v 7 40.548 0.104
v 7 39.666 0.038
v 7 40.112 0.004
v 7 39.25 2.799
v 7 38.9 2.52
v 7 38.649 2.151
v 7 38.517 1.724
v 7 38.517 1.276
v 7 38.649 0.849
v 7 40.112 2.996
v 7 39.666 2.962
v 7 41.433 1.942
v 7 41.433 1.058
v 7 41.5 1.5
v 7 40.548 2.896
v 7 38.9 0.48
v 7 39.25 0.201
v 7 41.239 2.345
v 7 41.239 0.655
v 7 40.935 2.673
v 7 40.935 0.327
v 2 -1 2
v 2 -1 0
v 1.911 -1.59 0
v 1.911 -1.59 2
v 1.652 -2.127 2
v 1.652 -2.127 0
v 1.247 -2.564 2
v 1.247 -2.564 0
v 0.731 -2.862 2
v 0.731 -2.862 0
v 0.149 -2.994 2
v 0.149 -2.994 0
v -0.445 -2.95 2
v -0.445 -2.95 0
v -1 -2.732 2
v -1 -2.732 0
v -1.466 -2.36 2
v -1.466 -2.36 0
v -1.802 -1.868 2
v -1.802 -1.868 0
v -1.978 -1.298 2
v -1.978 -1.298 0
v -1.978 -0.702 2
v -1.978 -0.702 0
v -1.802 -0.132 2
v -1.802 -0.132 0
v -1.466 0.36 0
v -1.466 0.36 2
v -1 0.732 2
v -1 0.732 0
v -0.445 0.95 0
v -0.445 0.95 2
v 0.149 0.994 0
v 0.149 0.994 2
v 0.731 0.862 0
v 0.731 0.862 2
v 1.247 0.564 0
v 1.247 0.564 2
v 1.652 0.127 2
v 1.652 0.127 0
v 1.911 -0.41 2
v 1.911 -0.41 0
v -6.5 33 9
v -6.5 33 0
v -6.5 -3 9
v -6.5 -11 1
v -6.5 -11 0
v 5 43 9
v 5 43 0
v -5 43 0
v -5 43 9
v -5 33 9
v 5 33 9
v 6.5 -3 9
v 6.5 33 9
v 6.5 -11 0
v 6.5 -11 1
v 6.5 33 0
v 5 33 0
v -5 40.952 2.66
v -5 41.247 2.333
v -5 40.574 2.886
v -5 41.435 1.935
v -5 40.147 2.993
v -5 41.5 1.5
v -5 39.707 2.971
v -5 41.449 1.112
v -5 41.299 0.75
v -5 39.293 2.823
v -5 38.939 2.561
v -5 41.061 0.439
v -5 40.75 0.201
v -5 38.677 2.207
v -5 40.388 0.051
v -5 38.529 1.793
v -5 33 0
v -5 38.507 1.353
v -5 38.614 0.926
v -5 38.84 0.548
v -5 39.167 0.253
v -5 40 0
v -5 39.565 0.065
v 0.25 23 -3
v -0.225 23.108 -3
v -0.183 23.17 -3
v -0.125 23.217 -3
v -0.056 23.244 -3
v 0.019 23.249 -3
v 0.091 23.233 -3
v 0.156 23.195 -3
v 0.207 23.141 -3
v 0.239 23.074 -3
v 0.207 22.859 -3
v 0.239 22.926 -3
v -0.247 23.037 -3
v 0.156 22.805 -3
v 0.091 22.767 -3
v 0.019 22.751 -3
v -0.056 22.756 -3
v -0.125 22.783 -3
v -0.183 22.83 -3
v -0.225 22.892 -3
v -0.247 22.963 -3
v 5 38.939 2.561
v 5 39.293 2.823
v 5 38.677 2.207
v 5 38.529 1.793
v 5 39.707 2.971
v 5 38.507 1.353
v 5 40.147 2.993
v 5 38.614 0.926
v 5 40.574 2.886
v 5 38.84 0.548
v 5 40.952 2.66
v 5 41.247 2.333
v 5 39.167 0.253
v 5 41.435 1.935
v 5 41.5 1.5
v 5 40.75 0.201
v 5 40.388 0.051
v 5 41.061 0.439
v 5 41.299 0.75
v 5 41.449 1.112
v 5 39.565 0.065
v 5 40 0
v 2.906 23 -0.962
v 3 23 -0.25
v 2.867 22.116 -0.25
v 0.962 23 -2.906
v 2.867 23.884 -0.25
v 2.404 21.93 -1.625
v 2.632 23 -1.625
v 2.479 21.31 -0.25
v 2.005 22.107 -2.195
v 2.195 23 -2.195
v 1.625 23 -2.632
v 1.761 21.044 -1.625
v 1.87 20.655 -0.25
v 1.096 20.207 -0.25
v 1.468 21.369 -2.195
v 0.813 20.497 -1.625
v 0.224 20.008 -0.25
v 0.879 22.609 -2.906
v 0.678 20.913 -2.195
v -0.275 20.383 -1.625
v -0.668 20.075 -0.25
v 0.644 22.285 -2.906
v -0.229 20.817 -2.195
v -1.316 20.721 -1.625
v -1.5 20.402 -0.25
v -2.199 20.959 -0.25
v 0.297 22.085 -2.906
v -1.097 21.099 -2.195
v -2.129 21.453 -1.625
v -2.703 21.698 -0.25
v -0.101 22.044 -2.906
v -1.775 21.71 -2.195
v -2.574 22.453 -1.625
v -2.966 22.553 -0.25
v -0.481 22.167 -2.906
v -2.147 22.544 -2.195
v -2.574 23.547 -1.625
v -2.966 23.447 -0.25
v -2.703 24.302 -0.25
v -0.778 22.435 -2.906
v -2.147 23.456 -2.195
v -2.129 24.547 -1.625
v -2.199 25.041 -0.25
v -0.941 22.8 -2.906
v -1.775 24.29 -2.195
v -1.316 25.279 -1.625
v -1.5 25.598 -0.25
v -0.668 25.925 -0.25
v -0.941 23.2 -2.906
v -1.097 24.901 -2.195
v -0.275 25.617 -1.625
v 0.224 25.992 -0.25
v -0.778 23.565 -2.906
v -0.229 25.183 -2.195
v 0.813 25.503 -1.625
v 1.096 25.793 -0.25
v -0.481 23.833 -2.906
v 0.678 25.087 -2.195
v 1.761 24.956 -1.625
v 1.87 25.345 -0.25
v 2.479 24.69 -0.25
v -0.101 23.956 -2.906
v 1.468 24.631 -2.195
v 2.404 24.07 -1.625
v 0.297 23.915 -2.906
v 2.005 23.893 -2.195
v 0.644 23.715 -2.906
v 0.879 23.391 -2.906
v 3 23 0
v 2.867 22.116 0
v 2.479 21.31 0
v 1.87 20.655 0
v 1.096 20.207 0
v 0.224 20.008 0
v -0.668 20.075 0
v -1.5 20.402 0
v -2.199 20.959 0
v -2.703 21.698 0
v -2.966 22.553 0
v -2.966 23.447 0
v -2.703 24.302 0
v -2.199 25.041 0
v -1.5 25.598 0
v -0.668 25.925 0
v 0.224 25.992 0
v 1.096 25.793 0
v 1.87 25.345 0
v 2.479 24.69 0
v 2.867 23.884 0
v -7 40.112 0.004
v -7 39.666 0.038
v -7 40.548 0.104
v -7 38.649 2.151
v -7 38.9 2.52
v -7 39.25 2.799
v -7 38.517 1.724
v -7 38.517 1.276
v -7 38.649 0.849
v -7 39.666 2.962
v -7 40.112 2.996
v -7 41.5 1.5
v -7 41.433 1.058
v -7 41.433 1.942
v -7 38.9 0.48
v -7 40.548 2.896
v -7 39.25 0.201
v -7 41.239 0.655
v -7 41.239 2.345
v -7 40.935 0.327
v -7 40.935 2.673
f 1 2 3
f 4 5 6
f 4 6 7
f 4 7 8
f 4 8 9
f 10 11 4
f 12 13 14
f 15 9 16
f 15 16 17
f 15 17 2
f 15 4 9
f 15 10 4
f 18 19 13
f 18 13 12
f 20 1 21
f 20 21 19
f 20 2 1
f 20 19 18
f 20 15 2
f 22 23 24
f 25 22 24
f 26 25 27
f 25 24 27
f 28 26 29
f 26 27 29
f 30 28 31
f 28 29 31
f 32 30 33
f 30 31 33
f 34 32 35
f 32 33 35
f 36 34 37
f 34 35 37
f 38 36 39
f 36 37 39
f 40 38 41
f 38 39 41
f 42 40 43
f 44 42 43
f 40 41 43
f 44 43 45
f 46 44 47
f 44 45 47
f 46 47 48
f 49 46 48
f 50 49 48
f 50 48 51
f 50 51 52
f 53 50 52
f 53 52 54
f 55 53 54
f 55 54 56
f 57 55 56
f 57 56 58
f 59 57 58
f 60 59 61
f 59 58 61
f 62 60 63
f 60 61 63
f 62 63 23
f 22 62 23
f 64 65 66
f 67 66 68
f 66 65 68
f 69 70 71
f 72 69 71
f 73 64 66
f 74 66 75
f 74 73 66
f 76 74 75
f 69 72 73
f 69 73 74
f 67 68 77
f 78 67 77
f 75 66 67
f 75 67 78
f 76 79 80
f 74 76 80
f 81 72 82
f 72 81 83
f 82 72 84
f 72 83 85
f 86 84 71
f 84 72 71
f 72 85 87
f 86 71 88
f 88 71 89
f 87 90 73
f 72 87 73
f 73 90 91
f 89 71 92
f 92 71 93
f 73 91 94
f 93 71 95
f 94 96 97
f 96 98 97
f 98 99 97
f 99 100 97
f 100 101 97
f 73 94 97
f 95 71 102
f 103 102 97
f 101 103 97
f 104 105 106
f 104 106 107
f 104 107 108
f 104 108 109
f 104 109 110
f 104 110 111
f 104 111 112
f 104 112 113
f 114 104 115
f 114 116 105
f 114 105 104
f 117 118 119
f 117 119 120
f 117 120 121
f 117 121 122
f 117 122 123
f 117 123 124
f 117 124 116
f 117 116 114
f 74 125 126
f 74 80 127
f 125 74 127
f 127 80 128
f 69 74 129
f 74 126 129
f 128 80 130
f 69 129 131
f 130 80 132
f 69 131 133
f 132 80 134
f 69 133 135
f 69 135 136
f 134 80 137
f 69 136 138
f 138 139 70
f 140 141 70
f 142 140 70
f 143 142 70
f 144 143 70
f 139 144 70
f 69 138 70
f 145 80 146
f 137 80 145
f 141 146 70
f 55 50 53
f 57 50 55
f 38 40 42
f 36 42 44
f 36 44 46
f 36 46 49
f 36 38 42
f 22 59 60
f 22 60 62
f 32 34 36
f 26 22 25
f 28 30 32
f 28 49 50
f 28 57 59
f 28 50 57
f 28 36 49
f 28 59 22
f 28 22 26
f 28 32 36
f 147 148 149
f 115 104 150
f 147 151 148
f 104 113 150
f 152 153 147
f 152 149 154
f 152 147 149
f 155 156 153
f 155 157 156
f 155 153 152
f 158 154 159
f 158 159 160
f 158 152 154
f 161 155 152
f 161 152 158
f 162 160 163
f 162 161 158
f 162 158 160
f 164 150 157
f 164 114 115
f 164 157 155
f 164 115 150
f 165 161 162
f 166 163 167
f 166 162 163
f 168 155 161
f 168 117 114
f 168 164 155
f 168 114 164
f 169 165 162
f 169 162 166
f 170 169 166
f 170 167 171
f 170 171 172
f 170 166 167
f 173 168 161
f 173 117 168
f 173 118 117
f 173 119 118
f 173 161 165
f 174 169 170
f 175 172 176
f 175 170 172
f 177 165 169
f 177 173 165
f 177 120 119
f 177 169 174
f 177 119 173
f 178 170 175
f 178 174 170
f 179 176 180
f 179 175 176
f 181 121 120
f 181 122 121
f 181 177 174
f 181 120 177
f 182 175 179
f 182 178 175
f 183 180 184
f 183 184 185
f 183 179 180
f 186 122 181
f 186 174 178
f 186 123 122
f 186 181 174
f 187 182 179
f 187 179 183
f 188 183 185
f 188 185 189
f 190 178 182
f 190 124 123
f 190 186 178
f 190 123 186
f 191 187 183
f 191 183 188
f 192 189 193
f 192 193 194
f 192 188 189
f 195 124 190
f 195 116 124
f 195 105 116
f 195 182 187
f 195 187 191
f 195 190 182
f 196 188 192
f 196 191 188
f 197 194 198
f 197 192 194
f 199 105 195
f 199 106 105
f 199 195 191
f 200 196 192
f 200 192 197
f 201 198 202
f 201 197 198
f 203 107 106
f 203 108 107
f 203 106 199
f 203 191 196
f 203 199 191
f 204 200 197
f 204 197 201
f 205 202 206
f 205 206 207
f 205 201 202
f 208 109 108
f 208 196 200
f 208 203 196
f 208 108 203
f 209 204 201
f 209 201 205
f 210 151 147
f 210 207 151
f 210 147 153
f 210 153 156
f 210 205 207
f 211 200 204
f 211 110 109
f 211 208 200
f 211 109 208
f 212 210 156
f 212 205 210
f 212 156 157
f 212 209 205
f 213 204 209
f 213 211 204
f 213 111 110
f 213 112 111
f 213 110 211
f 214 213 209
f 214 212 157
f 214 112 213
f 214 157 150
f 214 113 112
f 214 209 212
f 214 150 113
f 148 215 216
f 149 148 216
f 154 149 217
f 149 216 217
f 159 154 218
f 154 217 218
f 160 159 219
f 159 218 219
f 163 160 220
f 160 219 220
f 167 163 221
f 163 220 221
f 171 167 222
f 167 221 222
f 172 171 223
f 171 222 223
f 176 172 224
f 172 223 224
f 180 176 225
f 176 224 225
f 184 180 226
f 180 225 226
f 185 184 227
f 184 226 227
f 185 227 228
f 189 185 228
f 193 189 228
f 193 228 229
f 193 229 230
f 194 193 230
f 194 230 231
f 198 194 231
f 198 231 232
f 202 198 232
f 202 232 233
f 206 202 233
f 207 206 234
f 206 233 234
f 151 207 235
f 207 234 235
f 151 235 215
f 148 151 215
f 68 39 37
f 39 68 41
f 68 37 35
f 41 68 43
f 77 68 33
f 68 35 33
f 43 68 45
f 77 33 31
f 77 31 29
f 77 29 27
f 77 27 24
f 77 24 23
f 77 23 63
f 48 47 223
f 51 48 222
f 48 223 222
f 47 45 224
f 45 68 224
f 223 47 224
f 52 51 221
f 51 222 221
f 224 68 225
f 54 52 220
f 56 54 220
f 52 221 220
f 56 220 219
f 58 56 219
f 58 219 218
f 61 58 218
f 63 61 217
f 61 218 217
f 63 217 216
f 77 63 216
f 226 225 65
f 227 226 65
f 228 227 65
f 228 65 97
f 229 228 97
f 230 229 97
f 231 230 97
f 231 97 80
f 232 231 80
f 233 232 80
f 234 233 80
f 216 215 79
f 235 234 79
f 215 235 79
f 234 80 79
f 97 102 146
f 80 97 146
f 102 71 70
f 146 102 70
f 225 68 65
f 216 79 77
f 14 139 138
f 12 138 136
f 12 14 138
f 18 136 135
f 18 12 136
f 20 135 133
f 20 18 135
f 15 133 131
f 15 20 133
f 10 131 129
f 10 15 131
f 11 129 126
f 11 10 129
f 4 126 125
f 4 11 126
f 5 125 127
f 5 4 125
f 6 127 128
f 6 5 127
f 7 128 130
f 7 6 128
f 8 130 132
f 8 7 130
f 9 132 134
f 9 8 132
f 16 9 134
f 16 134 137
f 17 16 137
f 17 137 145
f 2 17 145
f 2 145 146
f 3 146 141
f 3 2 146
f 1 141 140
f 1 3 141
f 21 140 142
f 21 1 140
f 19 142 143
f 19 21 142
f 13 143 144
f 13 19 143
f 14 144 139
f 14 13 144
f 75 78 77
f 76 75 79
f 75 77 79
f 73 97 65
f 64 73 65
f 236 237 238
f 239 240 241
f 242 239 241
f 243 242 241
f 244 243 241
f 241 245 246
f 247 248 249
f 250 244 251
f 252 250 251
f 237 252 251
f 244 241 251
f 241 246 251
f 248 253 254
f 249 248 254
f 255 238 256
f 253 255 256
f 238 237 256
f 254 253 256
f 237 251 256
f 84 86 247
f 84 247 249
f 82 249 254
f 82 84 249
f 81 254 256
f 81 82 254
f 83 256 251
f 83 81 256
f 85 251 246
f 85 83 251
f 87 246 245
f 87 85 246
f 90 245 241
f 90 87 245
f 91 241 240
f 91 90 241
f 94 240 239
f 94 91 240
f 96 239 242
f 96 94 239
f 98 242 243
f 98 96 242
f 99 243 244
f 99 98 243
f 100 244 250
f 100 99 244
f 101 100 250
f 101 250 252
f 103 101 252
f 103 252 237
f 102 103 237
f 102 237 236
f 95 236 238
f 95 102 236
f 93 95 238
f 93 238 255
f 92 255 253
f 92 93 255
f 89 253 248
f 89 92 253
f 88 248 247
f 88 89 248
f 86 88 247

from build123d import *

# Parameters (mm, degrees)
PAD_DEPTH    = 9
SKETCH001_R  = 1.5
PAD001_DEPTH = 7
SKETCH002_R  = 2
POCKET_DEPTH = 2
SKETCH003_R  = 3
PAD002_DEPTH = 3
FILLET_R     = 2.75
CHAMFER_SIZE = 8


with BuildPart() as part:
    # Sketch → Pad (new body)
    with BuildSketch(Plane.XY):
        Polygon((6.5, -11), (6.5, 33), (5, 33), (5, 43), (-5, 43), (-5, 33), (-6.5, 33), (-6.5, -11), align=None)
    extrude(amount=PAD_DEPTH)

    # Sketch001 → Pad001 (join, symmetric)
    with BuildSketch(Plane.YZ):
        with Locations((40, 1.5)):
            Circle(SKETCH001_R)
    extrude(amount=PAD001_DEPTH, both=True)

    # Sketch002 (on Face4 of Pad001) → Pocket (cut)
    with BuildSketch(Plane(origin=(0, 0, 0), x_dir=(1, 0, 0), z_dir=(0, 0, -1))):
        with Locations((0, 1)):
            Circle(SKETCH002_R)
    extrude(amount=-POCKET_DEPTH, mode=Mode.SUBTRACT)

    # Sketch003 (on Face4 of Pocket) → Pad002 (join)
    with BuildSketch(Plane(origin=(0, 0, 0), x_dir=(1, 0, 0), z_dir=(0, 0, -1))):
        with Locations((0, -23)):
            Circle(SKETCH003_R)
    extrude(amount=PAD002_DEPTH)

    # Fillet
    fillet_edges = [part.edges().sort_by_distance(p)[0] for p in [
        (-3, 23, -3),
    ]]
    fillet(fillet_edges, radius=FILLET_R)

    # Chamfer
    chamfer_edges = [part.edges().sort_by_distance(p)[0] for p in [
        (0, -11, 9),
    ]]
    chamfer(chamfer_edges, length=CHAMFER_SIZE)


solid = part.part
